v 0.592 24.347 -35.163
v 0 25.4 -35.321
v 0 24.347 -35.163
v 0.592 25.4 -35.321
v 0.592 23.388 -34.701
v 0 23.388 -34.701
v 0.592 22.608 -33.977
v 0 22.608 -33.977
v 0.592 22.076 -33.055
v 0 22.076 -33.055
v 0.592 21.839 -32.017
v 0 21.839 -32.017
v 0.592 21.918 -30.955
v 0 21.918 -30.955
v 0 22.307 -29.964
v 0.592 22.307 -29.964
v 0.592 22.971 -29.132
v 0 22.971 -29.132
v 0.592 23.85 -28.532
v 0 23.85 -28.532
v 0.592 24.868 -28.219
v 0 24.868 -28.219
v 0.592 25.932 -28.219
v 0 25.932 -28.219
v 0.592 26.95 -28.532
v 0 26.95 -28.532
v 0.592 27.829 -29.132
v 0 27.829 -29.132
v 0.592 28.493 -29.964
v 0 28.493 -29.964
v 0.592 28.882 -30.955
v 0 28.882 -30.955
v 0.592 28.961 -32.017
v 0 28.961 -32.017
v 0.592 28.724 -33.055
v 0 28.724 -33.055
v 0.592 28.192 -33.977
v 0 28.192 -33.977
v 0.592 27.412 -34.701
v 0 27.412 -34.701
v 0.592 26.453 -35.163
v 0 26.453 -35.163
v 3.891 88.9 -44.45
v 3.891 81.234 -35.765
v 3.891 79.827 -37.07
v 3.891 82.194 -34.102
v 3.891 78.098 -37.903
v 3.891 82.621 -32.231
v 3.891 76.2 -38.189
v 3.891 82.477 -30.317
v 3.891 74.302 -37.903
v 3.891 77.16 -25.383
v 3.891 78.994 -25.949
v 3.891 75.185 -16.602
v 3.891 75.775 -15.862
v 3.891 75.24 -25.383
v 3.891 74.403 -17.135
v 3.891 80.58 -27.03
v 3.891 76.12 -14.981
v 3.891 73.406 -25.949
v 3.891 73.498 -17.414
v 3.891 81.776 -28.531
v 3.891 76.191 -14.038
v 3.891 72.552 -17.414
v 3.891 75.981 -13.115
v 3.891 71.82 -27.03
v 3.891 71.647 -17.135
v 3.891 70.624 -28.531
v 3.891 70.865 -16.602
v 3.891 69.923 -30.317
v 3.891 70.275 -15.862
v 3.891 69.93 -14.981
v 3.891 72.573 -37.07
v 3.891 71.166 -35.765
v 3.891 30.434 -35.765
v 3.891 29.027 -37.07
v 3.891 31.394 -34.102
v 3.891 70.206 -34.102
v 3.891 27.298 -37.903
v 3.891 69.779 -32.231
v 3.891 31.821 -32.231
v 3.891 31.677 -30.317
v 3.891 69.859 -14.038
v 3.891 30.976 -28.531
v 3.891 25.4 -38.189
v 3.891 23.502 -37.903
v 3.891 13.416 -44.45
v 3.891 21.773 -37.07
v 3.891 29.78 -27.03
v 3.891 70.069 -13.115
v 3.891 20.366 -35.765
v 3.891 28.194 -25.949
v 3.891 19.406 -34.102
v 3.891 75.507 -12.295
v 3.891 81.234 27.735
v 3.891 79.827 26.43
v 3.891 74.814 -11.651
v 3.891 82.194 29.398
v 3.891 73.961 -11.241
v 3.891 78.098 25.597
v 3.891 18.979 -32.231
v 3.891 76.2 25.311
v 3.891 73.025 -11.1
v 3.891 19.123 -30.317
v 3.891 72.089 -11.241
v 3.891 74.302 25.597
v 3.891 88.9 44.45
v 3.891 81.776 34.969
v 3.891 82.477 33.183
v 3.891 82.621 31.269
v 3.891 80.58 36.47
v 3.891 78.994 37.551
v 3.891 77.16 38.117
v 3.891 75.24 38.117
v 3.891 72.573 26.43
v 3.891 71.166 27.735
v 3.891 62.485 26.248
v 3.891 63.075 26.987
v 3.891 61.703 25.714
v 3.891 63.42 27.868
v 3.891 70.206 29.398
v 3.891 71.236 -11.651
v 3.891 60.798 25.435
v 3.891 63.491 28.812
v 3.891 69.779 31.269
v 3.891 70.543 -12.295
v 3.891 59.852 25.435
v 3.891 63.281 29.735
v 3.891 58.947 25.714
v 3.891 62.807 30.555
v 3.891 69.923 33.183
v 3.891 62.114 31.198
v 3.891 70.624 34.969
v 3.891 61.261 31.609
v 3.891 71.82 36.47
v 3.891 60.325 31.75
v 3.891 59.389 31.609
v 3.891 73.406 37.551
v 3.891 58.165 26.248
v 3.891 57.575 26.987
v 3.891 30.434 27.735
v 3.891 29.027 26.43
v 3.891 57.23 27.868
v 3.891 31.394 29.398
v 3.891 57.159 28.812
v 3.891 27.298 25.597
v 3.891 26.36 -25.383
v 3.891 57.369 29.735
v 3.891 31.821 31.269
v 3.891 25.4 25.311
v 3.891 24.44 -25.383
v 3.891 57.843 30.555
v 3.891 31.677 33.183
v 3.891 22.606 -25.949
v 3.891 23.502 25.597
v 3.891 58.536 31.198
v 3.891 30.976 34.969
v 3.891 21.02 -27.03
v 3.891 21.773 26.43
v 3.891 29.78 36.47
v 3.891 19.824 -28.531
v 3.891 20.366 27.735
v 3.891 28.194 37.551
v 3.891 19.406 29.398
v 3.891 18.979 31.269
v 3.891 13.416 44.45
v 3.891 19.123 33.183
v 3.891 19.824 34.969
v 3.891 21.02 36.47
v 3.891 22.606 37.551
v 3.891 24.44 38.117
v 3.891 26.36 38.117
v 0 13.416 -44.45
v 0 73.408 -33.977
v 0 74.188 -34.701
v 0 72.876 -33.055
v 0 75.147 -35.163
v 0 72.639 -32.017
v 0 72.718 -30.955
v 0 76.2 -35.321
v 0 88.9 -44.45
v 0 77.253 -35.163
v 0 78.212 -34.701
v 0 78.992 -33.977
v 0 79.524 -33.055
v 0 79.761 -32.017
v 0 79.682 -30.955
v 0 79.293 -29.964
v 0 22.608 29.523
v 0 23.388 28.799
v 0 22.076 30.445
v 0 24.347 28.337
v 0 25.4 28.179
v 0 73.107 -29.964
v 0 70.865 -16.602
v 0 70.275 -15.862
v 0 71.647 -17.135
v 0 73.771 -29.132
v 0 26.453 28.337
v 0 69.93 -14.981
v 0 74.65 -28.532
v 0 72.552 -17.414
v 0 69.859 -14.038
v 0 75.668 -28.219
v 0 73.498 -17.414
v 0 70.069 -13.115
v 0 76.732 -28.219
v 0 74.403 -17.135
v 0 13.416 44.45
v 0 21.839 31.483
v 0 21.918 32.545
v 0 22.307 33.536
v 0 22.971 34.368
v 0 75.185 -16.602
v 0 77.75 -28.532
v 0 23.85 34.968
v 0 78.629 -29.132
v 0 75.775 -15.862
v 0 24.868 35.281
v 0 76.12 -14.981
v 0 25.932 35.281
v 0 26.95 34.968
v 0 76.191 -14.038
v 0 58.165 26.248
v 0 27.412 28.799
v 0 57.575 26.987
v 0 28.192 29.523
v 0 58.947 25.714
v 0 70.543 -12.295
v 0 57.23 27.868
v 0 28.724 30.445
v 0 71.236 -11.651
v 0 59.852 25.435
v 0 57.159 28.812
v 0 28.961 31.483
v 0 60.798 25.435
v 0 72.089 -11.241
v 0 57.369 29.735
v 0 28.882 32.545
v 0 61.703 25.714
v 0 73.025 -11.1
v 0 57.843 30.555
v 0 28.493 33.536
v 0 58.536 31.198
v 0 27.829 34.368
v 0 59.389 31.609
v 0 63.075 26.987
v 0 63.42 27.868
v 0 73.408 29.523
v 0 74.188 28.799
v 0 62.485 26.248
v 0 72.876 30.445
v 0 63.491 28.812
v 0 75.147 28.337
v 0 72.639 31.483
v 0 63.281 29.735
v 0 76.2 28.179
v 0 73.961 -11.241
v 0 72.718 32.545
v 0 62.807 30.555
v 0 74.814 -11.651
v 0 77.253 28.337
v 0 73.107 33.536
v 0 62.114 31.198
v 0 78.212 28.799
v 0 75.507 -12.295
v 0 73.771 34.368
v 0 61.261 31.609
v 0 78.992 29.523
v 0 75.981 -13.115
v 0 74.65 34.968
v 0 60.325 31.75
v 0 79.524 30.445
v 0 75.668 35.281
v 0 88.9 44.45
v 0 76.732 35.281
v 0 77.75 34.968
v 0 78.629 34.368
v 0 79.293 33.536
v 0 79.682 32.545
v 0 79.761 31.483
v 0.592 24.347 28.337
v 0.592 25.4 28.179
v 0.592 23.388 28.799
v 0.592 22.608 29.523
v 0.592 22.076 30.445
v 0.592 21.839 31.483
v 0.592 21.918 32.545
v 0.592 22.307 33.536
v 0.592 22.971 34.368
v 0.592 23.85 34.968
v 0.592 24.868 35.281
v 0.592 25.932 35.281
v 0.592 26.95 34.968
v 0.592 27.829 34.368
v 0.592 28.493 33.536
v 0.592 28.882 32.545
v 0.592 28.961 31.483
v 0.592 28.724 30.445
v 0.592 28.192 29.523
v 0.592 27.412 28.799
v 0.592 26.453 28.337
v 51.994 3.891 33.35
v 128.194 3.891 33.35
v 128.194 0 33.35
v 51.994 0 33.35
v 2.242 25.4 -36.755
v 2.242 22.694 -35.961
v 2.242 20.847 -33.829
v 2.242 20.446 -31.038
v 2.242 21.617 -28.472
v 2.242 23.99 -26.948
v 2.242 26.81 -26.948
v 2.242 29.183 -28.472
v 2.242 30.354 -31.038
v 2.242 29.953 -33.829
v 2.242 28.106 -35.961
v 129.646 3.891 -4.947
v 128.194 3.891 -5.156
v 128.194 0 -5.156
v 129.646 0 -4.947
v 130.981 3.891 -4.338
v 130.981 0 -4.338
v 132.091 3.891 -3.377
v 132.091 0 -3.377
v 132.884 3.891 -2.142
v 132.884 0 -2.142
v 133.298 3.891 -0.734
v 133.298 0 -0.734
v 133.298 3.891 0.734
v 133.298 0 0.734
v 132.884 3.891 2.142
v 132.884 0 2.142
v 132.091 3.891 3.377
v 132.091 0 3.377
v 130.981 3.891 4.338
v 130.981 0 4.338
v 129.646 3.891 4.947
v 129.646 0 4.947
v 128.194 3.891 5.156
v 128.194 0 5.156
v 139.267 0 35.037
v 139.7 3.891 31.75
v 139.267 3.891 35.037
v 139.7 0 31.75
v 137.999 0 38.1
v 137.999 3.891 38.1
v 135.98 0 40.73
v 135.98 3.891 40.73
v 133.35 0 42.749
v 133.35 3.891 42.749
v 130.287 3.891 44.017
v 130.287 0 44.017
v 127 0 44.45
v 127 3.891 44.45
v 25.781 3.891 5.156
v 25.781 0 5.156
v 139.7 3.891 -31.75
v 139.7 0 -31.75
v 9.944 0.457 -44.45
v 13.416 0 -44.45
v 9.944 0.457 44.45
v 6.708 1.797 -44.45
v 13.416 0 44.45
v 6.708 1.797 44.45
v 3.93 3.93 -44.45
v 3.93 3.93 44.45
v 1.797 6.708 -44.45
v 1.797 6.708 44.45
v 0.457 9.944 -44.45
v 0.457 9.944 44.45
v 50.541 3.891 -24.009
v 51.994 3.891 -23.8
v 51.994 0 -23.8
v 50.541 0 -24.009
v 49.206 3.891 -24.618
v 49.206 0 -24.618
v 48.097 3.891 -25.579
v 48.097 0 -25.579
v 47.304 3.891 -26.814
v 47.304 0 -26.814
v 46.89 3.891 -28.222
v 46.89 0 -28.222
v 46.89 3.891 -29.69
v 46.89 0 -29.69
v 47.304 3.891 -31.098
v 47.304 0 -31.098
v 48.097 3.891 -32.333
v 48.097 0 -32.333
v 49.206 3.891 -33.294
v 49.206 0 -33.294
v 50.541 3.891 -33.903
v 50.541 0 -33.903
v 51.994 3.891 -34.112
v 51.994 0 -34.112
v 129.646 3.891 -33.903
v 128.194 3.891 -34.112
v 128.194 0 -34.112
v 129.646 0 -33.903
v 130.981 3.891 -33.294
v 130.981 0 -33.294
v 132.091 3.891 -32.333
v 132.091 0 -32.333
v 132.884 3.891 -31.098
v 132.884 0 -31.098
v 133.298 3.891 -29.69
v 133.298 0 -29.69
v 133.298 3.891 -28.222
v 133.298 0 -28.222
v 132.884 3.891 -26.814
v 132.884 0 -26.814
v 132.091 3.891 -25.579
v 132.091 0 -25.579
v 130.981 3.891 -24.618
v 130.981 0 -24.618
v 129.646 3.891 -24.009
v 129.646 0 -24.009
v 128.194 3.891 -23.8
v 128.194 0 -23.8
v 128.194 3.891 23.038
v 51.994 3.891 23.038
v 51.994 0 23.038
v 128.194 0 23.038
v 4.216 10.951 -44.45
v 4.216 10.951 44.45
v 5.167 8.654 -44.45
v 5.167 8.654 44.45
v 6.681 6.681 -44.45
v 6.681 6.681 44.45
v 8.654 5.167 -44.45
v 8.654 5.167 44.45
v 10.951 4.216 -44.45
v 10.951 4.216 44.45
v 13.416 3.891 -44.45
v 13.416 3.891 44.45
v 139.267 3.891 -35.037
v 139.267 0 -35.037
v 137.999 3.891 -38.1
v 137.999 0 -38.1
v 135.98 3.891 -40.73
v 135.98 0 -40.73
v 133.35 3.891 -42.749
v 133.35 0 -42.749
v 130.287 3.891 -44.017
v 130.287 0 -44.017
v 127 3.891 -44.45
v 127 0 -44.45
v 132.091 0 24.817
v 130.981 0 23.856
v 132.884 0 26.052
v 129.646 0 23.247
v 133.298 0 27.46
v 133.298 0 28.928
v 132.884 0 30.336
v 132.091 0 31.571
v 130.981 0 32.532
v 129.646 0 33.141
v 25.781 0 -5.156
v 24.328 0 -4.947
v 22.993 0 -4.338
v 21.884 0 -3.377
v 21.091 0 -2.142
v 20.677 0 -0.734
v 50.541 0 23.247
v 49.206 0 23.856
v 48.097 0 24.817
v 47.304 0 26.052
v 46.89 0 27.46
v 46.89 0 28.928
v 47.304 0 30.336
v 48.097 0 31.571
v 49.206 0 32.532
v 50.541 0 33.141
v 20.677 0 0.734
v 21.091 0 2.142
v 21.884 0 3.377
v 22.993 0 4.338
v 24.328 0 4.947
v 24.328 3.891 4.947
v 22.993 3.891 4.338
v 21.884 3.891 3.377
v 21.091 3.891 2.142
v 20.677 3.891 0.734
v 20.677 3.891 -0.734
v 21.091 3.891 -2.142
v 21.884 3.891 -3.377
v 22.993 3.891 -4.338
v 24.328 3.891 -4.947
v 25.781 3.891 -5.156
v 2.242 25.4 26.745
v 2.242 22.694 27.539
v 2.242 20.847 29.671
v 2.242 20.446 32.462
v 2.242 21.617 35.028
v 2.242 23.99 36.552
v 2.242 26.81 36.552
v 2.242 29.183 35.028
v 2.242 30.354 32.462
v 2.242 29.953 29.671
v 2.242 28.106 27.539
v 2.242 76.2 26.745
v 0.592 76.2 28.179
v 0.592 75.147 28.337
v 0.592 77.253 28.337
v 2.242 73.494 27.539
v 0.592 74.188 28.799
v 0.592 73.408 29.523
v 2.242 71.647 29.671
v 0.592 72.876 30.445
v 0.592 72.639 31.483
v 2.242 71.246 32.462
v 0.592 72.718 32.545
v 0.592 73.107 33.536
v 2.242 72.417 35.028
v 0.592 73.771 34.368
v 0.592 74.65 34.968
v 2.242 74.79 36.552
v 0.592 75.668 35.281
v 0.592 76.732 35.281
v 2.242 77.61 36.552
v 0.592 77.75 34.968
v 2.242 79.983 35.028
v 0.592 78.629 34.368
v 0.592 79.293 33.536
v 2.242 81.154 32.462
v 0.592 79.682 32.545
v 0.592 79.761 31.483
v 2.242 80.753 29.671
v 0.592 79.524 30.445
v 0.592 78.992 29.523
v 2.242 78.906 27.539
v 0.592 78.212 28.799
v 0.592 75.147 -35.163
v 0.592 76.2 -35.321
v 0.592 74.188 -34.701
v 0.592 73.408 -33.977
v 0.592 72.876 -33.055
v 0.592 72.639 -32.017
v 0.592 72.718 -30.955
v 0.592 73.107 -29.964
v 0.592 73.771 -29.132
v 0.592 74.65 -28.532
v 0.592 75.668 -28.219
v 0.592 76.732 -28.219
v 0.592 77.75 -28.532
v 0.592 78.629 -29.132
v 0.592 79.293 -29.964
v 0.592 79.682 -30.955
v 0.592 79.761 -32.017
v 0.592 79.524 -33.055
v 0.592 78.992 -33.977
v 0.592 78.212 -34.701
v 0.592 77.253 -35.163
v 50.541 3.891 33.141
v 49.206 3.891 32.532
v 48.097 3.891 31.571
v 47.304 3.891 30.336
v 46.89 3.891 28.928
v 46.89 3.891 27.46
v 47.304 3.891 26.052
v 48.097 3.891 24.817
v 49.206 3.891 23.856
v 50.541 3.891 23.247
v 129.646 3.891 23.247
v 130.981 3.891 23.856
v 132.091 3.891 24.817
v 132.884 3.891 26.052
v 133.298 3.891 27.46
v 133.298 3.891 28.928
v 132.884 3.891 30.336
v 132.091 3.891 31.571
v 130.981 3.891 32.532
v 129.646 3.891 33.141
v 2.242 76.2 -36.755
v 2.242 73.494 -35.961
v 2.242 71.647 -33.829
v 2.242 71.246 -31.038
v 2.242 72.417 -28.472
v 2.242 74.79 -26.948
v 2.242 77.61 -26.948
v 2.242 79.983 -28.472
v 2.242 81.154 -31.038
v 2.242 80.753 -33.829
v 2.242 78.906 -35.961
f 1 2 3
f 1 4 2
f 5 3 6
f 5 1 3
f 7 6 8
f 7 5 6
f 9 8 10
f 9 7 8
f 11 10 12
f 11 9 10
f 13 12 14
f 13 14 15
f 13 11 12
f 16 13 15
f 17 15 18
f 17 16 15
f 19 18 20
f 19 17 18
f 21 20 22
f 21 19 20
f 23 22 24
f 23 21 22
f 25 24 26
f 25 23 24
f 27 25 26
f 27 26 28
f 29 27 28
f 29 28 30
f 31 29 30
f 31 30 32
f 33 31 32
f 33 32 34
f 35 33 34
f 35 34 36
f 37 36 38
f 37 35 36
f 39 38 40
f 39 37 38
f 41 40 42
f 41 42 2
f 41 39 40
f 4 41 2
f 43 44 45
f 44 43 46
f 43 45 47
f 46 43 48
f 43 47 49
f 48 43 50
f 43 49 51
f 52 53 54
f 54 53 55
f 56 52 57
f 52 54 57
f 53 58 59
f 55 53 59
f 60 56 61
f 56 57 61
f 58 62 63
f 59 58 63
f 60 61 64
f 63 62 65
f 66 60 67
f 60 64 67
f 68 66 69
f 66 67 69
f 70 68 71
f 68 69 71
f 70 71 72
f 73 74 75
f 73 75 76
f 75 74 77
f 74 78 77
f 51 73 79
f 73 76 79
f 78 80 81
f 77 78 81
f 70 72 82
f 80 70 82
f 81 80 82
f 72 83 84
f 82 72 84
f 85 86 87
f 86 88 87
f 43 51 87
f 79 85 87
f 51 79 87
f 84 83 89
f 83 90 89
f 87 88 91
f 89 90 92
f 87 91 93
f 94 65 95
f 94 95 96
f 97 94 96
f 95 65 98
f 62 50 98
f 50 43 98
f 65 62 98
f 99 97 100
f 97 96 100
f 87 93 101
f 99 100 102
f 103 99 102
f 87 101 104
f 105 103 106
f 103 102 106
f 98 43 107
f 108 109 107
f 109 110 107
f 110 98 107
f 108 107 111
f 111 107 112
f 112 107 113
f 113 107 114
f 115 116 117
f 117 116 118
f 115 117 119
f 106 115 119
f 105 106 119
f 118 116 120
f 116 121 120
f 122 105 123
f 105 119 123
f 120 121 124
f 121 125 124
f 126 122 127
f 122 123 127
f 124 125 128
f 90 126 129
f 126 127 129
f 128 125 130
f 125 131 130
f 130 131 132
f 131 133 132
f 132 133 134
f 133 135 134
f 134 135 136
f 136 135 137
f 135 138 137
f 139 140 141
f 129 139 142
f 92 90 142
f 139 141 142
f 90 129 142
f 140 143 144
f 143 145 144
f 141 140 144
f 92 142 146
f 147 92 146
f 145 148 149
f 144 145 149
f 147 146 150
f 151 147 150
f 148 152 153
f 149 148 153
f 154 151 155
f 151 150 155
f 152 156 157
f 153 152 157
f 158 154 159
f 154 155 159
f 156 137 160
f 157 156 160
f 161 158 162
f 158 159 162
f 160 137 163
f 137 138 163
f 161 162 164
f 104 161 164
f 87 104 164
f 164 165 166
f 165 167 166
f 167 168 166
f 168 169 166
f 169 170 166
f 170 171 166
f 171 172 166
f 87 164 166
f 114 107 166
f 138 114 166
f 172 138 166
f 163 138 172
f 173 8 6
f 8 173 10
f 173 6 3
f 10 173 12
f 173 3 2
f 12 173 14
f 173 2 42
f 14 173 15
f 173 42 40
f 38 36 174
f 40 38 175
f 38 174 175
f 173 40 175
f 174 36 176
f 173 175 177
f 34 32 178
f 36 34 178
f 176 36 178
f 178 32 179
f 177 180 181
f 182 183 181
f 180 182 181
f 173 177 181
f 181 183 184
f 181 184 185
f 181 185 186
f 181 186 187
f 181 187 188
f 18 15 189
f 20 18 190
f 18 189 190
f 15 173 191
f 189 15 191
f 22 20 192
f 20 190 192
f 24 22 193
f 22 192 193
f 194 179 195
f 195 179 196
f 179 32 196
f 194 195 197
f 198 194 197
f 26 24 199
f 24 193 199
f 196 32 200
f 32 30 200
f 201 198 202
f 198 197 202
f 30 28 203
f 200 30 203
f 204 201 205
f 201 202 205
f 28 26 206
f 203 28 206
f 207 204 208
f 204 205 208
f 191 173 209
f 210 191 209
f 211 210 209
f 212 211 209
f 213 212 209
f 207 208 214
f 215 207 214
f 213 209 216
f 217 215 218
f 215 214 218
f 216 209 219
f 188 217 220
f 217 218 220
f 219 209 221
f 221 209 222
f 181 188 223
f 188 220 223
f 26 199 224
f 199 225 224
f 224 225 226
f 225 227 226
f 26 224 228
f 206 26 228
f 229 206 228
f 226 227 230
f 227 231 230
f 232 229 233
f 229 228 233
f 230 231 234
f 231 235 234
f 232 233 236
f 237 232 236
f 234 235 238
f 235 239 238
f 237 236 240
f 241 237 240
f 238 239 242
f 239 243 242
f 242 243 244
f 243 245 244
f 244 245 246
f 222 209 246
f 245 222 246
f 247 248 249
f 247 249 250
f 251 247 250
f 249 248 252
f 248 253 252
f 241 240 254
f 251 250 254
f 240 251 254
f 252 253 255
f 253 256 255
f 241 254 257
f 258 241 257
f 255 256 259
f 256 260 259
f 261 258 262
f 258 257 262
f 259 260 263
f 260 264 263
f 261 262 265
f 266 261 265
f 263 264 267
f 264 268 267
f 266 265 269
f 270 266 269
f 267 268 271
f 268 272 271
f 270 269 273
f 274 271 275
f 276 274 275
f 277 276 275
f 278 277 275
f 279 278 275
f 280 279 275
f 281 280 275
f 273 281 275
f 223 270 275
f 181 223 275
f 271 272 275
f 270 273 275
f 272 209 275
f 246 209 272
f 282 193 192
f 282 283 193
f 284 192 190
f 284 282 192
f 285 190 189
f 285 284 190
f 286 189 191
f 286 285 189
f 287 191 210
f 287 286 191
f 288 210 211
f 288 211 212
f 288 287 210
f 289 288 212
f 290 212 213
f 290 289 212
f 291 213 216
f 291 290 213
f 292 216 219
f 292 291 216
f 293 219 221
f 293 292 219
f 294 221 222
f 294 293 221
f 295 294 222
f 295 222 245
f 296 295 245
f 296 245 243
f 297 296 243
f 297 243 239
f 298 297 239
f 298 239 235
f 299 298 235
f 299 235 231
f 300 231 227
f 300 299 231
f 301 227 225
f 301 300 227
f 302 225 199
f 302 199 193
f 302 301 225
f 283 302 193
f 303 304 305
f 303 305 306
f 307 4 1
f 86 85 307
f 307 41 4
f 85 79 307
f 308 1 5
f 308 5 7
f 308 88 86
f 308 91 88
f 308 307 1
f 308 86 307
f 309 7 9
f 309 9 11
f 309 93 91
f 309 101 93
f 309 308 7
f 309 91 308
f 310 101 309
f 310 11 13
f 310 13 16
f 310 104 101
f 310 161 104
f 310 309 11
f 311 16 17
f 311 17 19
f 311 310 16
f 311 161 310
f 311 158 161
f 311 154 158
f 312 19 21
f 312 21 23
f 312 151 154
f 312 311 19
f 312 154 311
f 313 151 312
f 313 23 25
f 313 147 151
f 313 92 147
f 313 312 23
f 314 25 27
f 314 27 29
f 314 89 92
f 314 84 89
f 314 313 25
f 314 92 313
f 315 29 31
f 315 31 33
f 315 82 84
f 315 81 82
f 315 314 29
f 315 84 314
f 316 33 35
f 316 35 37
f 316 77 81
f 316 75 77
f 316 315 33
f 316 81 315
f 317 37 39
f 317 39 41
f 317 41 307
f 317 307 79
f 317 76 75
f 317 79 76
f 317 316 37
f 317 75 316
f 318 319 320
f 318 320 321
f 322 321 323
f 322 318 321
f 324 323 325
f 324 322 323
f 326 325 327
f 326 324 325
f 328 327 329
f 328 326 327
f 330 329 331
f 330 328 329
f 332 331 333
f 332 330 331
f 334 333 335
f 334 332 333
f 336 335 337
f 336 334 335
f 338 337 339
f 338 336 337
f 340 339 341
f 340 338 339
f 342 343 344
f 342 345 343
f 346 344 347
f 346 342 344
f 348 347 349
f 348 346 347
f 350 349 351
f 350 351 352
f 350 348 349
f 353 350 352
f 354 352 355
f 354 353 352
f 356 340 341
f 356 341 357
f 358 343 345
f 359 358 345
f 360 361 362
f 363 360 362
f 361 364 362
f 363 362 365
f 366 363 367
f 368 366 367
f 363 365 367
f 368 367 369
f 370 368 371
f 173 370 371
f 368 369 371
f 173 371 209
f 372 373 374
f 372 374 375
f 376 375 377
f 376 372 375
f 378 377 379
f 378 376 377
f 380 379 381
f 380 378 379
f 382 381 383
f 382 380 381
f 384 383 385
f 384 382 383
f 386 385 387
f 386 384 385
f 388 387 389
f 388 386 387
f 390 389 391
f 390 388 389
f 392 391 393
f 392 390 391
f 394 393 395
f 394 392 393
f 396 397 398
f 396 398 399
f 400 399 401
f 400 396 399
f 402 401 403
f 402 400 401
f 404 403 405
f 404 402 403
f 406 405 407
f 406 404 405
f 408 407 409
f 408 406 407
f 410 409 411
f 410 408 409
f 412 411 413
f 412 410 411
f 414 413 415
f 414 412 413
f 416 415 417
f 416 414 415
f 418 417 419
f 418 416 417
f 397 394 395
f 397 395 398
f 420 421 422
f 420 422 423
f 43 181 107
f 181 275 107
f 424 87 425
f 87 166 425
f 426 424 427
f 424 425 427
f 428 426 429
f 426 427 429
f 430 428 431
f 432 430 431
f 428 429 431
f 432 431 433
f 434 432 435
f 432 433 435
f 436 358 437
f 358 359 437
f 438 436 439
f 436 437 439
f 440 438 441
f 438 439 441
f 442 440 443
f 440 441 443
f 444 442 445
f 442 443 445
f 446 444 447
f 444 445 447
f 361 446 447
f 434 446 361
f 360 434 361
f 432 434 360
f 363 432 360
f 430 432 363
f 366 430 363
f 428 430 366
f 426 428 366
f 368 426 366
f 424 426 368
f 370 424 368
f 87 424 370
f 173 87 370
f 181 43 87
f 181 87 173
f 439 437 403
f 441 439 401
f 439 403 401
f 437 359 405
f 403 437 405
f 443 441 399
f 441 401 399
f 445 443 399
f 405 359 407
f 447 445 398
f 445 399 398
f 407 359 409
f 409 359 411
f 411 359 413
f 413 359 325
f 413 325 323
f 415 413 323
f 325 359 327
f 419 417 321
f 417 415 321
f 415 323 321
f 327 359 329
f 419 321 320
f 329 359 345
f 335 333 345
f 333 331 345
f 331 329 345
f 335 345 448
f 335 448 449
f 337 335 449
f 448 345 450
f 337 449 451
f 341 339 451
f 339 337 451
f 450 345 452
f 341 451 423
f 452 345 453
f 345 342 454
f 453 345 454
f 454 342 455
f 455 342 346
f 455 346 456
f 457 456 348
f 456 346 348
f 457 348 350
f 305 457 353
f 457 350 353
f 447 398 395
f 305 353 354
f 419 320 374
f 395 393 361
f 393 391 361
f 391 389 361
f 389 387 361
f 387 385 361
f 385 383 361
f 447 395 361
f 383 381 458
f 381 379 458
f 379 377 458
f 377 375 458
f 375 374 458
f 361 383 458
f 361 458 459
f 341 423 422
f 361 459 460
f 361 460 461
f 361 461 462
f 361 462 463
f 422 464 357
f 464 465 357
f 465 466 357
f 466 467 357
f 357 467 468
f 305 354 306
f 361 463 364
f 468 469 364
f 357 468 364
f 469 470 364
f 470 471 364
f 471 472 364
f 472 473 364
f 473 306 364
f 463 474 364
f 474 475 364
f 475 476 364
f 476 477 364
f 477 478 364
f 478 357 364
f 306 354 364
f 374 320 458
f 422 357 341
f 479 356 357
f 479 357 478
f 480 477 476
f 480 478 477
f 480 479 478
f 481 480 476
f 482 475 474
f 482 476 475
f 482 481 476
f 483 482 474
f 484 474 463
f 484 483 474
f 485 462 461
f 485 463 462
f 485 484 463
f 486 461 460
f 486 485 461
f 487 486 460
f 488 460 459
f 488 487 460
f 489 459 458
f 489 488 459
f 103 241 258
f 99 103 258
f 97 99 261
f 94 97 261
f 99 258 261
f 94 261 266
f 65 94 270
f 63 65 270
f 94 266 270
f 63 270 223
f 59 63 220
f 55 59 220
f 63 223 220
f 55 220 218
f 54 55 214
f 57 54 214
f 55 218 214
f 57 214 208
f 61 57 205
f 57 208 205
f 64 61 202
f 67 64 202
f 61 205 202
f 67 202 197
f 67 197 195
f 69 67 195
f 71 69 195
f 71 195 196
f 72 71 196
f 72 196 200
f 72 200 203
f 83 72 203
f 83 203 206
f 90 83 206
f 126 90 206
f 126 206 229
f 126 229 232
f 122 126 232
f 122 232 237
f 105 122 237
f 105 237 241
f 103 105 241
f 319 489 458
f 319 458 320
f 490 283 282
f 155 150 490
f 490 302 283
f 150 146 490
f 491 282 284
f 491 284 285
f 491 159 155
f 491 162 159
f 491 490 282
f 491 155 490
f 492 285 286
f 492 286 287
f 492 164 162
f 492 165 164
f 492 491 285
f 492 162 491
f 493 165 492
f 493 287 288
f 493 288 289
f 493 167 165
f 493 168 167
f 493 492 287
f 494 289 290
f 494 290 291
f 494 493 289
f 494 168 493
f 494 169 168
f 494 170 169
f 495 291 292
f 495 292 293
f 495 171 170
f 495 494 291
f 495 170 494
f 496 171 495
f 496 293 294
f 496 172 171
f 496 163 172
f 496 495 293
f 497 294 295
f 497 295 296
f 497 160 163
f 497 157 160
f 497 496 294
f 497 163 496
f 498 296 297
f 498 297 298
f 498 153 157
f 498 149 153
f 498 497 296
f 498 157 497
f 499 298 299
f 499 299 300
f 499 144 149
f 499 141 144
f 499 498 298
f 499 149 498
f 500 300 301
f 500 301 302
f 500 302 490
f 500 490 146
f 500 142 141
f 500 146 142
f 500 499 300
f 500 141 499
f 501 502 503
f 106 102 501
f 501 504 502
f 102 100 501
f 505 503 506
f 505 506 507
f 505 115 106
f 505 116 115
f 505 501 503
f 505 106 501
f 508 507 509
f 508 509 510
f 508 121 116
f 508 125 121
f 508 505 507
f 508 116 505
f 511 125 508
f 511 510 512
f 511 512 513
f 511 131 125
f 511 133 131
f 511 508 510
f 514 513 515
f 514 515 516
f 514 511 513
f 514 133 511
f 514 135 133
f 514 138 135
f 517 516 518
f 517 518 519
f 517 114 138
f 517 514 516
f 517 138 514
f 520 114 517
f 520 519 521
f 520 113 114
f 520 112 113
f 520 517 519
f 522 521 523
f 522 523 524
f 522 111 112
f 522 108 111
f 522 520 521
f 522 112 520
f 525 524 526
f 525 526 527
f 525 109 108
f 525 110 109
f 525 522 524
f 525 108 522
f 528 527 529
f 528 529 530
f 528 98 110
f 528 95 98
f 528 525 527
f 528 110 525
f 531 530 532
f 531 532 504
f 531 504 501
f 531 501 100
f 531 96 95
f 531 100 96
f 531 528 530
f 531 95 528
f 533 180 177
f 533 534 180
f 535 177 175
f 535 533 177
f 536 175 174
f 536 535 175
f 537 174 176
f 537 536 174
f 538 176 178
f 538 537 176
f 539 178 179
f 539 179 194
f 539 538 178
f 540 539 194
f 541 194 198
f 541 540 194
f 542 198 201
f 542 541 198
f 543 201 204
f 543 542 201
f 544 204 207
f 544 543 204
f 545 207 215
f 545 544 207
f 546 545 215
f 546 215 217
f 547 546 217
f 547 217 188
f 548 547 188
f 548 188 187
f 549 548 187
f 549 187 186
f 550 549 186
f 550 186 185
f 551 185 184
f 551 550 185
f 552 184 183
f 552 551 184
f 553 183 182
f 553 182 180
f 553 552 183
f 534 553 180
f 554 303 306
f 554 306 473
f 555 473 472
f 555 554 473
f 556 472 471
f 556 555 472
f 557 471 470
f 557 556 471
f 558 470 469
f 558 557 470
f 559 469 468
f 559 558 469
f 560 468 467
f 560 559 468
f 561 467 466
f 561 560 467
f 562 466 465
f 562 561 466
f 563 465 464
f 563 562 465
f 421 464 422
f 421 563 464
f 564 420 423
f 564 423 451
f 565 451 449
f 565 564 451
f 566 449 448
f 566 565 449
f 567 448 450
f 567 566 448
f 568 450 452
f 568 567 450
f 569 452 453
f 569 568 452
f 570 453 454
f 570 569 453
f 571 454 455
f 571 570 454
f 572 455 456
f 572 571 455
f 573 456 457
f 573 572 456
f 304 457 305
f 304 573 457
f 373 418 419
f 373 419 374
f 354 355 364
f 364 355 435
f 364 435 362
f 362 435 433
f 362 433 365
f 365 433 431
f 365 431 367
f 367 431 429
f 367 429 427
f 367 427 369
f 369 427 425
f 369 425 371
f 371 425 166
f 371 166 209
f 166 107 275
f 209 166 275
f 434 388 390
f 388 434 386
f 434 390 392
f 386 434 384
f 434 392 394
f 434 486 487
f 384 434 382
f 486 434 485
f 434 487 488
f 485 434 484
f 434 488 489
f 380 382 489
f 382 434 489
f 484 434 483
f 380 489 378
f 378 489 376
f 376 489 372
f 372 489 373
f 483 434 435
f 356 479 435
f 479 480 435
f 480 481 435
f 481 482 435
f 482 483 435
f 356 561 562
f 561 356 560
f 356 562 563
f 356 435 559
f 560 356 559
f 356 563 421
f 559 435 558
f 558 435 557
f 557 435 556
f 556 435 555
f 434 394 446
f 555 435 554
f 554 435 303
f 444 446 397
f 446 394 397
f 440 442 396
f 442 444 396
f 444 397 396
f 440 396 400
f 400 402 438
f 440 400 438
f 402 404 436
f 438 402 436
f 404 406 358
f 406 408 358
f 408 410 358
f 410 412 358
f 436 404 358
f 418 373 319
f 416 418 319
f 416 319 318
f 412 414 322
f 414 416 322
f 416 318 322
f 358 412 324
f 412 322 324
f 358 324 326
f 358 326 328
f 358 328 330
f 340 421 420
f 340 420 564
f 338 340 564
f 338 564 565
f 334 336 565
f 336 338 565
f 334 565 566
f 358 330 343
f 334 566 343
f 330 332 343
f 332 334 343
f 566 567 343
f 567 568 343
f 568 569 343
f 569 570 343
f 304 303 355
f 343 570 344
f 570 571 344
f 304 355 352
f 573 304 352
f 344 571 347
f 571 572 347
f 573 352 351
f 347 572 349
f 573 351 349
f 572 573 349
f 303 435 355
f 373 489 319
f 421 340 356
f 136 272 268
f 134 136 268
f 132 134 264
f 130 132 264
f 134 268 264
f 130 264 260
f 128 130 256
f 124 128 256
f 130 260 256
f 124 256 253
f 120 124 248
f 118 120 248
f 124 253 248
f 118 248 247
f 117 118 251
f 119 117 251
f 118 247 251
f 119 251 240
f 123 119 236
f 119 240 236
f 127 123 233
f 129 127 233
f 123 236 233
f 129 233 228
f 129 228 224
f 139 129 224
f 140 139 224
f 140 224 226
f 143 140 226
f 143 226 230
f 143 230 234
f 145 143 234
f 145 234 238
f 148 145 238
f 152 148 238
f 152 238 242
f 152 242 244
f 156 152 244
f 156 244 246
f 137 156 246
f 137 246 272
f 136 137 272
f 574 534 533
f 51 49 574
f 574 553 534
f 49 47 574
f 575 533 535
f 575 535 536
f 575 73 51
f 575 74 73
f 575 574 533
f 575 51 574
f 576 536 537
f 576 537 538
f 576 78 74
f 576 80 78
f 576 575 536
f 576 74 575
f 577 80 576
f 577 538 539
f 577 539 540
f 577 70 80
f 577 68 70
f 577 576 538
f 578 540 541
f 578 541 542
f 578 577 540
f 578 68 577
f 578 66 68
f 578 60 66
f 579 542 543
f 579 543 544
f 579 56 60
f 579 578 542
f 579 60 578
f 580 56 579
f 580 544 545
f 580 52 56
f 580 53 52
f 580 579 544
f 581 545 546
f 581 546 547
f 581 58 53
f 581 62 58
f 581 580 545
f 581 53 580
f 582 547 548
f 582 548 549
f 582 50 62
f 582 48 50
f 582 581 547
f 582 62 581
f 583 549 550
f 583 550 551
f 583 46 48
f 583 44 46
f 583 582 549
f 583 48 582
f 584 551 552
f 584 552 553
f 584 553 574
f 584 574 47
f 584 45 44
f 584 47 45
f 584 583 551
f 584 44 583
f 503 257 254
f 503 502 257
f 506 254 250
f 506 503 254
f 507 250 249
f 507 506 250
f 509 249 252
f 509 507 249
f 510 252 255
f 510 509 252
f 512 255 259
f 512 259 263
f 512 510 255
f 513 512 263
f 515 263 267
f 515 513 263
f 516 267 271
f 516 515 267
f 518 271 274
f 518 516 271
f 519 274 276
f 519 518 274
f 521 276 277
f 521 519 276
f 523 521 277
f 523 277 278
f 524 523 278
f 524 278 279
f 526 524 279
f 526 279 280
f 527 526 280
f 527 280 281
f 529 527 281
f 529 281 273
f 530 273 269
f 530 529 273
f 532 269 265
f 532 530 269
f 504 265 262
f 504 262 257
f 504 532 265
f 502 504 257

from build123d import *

# Parameters (mm, degrees)
BASE_FLANGE1_DEPTH          = 44.45
LONG_SLOT_DEPTH             = 170.46496681
SHORT_SLOT_DEPTH            = 170.46496681
LPATTERN1_COUNT             = 2
LPATTERN1_PITCH             = 57.15
LPATTERN2_COUNT             = 2
LPATTERN2_PITCH             = 63.5
LPATTERN2_COUNT_DIR2        = 2
LPATTERN2_PITCH_DIR2        = 50.8
F_1_4_0_25_DIAMETER_HOLE1_D = 6.35
FILLET1_R                   = 12.7


# Sheet-metal steps are written as plain solids
with BuildPart() as part:
    # Sketch1 → Base-Flange1 (new, symmetric)
    with BuildSketch(Plane.XY):
        with BuildLine():
            Line((139.7, 0), (13.41628, 0))
            ThreePointArc((13.41628, 0), (3.929537434, 3.929537434), (0, 13.41628))
            Line((0, 13.41628), (0, 88.9))
            Line((0, 88.9), (3.89128, 88.9))
            Line((3.89128, 88.9), (3.89128, 13.41628))
            ThreePointArc((3.89128, 13.41628), (6.681087909, 6.681087909), (13.41628, 3.89128))
            Line((13.41628, 3.89128), (139.7, 3.89128))
            Line((139.7, 3.89128), (139.7, 0))
        make_face()
    extrude(amount=BASE_FLANGE1_DEPTH, both=True)

    # Sketch4 → LONG-SLOT (cut, through all)
    with BuildSketch(Plane(origin=(0, 3.89128, 0), x_dir=(1, 0, 0), z_dir=(0, 1, 0))):
        with BuildLine():
            Line((25.781, 5.1562), (128.1938, 5.1562))
            ThreePointArc((128.1938, 5.1562), (133.35, 0), (128.1938, -5.1562))
            Line((128.1938, -5.1562), (25.781, -5.1562))
            ThreePointArc((25.781, -5.1562), (20.6248, 0), (25.781, 5.1562))
        make_face()
    extrude(amount=-LONG_SLOT_DEPTH, mode=Mode.SUBTRACT)

    # Sketch5 → SHORT-SLOT (cut, through all)
    with BuildSketch(Plane(origin=(0, 3.89128, 0), x_dir=(1, 0, 0), z_dir=(0, 1, 0))):
        with BuildLine():
            Line((51.9938, -23.0378), (128.1938, -23.0378))
            ThreePointArc((128.1938, -23.0378), (133.35, -28.194), (128.1938, -33.3502))
            Line((128.1938, -33.3502), (51.9938, -33.3502))
            ThreePointArc((51.9938, -33.3502), (46.8376, -28.194), (51.9938, -23.0378))
        make_face()
    short_slot = extrude(amount=-SHORT_SLOT_DEPTH, mode=Mode.SUBTRACT)

    # LPattern1: SHORT-SLOT ×2
    with Locations(*[(0, 0, -i * LPATTERN1_PITCH) for i in range(1, LPATTERN1_COUNT)]):
        add(short_slot, mode=Mode.SUBTRACT)

    # Sketch6 → CSK for 1/4 Flat Head Machine Screw1 (revolve, cut)
    with BuildSketch(Plane(origin=(3.89128, 76.2, 31.75), x_dir=(0, 0, -1), z_dir=(0, 1, 0))):
        Polygon((0, 0), (0, 3.89128), (3.57124, 3.89128), (3.57124, 3.298865467), (6.4389, 0), align=None)
    csk_for_1_4_flat_head_machine_screw1 = revolve(axis=Axis((10.24128, 76.2, 31.75), (-1, 0, 0)), mode=Mode.SUBTRACT)

    # LPattern2: CSK for 1_4 Flat Head Machine Screw1 2 × 2
    with Locations(*[(0, -j * LPATTERN2_PITCH_DIR2, -i * LPATTERN2_PITCH) for i in range(LPATTERN2_COUNT) for j in range(LPATTERN2_COUNT_DIR2) if (i, j) != (0, 0)]):
        add(csk_for_1_4_flat_head_machine_screw1, mode=Mode.SUBTRACT)

    # 1/4 (0.25) Diameter Hole1 (through all)
    with Locations(Plane(origin=(3.89128, 0, 0), x_dir=(0, 0, -1), z_dir=(1, 0, 0))):
        with Locations((-28.575, 60.325), (14.2748, 73.025)):
            Hole(F_1_4_0_25_DIAMETER_HOLE1_D / 2)

    # Fillet1
    fillet1_edges = [part.edges().sort_by_distance(p)[0] for p in [
        (139.7, 1.94564, 44.45),
        (139.7, 1.94564, -44.45),
    ]]
    fillet(fillet1_edges, radius=FILLET1_R)


solid = part.part
